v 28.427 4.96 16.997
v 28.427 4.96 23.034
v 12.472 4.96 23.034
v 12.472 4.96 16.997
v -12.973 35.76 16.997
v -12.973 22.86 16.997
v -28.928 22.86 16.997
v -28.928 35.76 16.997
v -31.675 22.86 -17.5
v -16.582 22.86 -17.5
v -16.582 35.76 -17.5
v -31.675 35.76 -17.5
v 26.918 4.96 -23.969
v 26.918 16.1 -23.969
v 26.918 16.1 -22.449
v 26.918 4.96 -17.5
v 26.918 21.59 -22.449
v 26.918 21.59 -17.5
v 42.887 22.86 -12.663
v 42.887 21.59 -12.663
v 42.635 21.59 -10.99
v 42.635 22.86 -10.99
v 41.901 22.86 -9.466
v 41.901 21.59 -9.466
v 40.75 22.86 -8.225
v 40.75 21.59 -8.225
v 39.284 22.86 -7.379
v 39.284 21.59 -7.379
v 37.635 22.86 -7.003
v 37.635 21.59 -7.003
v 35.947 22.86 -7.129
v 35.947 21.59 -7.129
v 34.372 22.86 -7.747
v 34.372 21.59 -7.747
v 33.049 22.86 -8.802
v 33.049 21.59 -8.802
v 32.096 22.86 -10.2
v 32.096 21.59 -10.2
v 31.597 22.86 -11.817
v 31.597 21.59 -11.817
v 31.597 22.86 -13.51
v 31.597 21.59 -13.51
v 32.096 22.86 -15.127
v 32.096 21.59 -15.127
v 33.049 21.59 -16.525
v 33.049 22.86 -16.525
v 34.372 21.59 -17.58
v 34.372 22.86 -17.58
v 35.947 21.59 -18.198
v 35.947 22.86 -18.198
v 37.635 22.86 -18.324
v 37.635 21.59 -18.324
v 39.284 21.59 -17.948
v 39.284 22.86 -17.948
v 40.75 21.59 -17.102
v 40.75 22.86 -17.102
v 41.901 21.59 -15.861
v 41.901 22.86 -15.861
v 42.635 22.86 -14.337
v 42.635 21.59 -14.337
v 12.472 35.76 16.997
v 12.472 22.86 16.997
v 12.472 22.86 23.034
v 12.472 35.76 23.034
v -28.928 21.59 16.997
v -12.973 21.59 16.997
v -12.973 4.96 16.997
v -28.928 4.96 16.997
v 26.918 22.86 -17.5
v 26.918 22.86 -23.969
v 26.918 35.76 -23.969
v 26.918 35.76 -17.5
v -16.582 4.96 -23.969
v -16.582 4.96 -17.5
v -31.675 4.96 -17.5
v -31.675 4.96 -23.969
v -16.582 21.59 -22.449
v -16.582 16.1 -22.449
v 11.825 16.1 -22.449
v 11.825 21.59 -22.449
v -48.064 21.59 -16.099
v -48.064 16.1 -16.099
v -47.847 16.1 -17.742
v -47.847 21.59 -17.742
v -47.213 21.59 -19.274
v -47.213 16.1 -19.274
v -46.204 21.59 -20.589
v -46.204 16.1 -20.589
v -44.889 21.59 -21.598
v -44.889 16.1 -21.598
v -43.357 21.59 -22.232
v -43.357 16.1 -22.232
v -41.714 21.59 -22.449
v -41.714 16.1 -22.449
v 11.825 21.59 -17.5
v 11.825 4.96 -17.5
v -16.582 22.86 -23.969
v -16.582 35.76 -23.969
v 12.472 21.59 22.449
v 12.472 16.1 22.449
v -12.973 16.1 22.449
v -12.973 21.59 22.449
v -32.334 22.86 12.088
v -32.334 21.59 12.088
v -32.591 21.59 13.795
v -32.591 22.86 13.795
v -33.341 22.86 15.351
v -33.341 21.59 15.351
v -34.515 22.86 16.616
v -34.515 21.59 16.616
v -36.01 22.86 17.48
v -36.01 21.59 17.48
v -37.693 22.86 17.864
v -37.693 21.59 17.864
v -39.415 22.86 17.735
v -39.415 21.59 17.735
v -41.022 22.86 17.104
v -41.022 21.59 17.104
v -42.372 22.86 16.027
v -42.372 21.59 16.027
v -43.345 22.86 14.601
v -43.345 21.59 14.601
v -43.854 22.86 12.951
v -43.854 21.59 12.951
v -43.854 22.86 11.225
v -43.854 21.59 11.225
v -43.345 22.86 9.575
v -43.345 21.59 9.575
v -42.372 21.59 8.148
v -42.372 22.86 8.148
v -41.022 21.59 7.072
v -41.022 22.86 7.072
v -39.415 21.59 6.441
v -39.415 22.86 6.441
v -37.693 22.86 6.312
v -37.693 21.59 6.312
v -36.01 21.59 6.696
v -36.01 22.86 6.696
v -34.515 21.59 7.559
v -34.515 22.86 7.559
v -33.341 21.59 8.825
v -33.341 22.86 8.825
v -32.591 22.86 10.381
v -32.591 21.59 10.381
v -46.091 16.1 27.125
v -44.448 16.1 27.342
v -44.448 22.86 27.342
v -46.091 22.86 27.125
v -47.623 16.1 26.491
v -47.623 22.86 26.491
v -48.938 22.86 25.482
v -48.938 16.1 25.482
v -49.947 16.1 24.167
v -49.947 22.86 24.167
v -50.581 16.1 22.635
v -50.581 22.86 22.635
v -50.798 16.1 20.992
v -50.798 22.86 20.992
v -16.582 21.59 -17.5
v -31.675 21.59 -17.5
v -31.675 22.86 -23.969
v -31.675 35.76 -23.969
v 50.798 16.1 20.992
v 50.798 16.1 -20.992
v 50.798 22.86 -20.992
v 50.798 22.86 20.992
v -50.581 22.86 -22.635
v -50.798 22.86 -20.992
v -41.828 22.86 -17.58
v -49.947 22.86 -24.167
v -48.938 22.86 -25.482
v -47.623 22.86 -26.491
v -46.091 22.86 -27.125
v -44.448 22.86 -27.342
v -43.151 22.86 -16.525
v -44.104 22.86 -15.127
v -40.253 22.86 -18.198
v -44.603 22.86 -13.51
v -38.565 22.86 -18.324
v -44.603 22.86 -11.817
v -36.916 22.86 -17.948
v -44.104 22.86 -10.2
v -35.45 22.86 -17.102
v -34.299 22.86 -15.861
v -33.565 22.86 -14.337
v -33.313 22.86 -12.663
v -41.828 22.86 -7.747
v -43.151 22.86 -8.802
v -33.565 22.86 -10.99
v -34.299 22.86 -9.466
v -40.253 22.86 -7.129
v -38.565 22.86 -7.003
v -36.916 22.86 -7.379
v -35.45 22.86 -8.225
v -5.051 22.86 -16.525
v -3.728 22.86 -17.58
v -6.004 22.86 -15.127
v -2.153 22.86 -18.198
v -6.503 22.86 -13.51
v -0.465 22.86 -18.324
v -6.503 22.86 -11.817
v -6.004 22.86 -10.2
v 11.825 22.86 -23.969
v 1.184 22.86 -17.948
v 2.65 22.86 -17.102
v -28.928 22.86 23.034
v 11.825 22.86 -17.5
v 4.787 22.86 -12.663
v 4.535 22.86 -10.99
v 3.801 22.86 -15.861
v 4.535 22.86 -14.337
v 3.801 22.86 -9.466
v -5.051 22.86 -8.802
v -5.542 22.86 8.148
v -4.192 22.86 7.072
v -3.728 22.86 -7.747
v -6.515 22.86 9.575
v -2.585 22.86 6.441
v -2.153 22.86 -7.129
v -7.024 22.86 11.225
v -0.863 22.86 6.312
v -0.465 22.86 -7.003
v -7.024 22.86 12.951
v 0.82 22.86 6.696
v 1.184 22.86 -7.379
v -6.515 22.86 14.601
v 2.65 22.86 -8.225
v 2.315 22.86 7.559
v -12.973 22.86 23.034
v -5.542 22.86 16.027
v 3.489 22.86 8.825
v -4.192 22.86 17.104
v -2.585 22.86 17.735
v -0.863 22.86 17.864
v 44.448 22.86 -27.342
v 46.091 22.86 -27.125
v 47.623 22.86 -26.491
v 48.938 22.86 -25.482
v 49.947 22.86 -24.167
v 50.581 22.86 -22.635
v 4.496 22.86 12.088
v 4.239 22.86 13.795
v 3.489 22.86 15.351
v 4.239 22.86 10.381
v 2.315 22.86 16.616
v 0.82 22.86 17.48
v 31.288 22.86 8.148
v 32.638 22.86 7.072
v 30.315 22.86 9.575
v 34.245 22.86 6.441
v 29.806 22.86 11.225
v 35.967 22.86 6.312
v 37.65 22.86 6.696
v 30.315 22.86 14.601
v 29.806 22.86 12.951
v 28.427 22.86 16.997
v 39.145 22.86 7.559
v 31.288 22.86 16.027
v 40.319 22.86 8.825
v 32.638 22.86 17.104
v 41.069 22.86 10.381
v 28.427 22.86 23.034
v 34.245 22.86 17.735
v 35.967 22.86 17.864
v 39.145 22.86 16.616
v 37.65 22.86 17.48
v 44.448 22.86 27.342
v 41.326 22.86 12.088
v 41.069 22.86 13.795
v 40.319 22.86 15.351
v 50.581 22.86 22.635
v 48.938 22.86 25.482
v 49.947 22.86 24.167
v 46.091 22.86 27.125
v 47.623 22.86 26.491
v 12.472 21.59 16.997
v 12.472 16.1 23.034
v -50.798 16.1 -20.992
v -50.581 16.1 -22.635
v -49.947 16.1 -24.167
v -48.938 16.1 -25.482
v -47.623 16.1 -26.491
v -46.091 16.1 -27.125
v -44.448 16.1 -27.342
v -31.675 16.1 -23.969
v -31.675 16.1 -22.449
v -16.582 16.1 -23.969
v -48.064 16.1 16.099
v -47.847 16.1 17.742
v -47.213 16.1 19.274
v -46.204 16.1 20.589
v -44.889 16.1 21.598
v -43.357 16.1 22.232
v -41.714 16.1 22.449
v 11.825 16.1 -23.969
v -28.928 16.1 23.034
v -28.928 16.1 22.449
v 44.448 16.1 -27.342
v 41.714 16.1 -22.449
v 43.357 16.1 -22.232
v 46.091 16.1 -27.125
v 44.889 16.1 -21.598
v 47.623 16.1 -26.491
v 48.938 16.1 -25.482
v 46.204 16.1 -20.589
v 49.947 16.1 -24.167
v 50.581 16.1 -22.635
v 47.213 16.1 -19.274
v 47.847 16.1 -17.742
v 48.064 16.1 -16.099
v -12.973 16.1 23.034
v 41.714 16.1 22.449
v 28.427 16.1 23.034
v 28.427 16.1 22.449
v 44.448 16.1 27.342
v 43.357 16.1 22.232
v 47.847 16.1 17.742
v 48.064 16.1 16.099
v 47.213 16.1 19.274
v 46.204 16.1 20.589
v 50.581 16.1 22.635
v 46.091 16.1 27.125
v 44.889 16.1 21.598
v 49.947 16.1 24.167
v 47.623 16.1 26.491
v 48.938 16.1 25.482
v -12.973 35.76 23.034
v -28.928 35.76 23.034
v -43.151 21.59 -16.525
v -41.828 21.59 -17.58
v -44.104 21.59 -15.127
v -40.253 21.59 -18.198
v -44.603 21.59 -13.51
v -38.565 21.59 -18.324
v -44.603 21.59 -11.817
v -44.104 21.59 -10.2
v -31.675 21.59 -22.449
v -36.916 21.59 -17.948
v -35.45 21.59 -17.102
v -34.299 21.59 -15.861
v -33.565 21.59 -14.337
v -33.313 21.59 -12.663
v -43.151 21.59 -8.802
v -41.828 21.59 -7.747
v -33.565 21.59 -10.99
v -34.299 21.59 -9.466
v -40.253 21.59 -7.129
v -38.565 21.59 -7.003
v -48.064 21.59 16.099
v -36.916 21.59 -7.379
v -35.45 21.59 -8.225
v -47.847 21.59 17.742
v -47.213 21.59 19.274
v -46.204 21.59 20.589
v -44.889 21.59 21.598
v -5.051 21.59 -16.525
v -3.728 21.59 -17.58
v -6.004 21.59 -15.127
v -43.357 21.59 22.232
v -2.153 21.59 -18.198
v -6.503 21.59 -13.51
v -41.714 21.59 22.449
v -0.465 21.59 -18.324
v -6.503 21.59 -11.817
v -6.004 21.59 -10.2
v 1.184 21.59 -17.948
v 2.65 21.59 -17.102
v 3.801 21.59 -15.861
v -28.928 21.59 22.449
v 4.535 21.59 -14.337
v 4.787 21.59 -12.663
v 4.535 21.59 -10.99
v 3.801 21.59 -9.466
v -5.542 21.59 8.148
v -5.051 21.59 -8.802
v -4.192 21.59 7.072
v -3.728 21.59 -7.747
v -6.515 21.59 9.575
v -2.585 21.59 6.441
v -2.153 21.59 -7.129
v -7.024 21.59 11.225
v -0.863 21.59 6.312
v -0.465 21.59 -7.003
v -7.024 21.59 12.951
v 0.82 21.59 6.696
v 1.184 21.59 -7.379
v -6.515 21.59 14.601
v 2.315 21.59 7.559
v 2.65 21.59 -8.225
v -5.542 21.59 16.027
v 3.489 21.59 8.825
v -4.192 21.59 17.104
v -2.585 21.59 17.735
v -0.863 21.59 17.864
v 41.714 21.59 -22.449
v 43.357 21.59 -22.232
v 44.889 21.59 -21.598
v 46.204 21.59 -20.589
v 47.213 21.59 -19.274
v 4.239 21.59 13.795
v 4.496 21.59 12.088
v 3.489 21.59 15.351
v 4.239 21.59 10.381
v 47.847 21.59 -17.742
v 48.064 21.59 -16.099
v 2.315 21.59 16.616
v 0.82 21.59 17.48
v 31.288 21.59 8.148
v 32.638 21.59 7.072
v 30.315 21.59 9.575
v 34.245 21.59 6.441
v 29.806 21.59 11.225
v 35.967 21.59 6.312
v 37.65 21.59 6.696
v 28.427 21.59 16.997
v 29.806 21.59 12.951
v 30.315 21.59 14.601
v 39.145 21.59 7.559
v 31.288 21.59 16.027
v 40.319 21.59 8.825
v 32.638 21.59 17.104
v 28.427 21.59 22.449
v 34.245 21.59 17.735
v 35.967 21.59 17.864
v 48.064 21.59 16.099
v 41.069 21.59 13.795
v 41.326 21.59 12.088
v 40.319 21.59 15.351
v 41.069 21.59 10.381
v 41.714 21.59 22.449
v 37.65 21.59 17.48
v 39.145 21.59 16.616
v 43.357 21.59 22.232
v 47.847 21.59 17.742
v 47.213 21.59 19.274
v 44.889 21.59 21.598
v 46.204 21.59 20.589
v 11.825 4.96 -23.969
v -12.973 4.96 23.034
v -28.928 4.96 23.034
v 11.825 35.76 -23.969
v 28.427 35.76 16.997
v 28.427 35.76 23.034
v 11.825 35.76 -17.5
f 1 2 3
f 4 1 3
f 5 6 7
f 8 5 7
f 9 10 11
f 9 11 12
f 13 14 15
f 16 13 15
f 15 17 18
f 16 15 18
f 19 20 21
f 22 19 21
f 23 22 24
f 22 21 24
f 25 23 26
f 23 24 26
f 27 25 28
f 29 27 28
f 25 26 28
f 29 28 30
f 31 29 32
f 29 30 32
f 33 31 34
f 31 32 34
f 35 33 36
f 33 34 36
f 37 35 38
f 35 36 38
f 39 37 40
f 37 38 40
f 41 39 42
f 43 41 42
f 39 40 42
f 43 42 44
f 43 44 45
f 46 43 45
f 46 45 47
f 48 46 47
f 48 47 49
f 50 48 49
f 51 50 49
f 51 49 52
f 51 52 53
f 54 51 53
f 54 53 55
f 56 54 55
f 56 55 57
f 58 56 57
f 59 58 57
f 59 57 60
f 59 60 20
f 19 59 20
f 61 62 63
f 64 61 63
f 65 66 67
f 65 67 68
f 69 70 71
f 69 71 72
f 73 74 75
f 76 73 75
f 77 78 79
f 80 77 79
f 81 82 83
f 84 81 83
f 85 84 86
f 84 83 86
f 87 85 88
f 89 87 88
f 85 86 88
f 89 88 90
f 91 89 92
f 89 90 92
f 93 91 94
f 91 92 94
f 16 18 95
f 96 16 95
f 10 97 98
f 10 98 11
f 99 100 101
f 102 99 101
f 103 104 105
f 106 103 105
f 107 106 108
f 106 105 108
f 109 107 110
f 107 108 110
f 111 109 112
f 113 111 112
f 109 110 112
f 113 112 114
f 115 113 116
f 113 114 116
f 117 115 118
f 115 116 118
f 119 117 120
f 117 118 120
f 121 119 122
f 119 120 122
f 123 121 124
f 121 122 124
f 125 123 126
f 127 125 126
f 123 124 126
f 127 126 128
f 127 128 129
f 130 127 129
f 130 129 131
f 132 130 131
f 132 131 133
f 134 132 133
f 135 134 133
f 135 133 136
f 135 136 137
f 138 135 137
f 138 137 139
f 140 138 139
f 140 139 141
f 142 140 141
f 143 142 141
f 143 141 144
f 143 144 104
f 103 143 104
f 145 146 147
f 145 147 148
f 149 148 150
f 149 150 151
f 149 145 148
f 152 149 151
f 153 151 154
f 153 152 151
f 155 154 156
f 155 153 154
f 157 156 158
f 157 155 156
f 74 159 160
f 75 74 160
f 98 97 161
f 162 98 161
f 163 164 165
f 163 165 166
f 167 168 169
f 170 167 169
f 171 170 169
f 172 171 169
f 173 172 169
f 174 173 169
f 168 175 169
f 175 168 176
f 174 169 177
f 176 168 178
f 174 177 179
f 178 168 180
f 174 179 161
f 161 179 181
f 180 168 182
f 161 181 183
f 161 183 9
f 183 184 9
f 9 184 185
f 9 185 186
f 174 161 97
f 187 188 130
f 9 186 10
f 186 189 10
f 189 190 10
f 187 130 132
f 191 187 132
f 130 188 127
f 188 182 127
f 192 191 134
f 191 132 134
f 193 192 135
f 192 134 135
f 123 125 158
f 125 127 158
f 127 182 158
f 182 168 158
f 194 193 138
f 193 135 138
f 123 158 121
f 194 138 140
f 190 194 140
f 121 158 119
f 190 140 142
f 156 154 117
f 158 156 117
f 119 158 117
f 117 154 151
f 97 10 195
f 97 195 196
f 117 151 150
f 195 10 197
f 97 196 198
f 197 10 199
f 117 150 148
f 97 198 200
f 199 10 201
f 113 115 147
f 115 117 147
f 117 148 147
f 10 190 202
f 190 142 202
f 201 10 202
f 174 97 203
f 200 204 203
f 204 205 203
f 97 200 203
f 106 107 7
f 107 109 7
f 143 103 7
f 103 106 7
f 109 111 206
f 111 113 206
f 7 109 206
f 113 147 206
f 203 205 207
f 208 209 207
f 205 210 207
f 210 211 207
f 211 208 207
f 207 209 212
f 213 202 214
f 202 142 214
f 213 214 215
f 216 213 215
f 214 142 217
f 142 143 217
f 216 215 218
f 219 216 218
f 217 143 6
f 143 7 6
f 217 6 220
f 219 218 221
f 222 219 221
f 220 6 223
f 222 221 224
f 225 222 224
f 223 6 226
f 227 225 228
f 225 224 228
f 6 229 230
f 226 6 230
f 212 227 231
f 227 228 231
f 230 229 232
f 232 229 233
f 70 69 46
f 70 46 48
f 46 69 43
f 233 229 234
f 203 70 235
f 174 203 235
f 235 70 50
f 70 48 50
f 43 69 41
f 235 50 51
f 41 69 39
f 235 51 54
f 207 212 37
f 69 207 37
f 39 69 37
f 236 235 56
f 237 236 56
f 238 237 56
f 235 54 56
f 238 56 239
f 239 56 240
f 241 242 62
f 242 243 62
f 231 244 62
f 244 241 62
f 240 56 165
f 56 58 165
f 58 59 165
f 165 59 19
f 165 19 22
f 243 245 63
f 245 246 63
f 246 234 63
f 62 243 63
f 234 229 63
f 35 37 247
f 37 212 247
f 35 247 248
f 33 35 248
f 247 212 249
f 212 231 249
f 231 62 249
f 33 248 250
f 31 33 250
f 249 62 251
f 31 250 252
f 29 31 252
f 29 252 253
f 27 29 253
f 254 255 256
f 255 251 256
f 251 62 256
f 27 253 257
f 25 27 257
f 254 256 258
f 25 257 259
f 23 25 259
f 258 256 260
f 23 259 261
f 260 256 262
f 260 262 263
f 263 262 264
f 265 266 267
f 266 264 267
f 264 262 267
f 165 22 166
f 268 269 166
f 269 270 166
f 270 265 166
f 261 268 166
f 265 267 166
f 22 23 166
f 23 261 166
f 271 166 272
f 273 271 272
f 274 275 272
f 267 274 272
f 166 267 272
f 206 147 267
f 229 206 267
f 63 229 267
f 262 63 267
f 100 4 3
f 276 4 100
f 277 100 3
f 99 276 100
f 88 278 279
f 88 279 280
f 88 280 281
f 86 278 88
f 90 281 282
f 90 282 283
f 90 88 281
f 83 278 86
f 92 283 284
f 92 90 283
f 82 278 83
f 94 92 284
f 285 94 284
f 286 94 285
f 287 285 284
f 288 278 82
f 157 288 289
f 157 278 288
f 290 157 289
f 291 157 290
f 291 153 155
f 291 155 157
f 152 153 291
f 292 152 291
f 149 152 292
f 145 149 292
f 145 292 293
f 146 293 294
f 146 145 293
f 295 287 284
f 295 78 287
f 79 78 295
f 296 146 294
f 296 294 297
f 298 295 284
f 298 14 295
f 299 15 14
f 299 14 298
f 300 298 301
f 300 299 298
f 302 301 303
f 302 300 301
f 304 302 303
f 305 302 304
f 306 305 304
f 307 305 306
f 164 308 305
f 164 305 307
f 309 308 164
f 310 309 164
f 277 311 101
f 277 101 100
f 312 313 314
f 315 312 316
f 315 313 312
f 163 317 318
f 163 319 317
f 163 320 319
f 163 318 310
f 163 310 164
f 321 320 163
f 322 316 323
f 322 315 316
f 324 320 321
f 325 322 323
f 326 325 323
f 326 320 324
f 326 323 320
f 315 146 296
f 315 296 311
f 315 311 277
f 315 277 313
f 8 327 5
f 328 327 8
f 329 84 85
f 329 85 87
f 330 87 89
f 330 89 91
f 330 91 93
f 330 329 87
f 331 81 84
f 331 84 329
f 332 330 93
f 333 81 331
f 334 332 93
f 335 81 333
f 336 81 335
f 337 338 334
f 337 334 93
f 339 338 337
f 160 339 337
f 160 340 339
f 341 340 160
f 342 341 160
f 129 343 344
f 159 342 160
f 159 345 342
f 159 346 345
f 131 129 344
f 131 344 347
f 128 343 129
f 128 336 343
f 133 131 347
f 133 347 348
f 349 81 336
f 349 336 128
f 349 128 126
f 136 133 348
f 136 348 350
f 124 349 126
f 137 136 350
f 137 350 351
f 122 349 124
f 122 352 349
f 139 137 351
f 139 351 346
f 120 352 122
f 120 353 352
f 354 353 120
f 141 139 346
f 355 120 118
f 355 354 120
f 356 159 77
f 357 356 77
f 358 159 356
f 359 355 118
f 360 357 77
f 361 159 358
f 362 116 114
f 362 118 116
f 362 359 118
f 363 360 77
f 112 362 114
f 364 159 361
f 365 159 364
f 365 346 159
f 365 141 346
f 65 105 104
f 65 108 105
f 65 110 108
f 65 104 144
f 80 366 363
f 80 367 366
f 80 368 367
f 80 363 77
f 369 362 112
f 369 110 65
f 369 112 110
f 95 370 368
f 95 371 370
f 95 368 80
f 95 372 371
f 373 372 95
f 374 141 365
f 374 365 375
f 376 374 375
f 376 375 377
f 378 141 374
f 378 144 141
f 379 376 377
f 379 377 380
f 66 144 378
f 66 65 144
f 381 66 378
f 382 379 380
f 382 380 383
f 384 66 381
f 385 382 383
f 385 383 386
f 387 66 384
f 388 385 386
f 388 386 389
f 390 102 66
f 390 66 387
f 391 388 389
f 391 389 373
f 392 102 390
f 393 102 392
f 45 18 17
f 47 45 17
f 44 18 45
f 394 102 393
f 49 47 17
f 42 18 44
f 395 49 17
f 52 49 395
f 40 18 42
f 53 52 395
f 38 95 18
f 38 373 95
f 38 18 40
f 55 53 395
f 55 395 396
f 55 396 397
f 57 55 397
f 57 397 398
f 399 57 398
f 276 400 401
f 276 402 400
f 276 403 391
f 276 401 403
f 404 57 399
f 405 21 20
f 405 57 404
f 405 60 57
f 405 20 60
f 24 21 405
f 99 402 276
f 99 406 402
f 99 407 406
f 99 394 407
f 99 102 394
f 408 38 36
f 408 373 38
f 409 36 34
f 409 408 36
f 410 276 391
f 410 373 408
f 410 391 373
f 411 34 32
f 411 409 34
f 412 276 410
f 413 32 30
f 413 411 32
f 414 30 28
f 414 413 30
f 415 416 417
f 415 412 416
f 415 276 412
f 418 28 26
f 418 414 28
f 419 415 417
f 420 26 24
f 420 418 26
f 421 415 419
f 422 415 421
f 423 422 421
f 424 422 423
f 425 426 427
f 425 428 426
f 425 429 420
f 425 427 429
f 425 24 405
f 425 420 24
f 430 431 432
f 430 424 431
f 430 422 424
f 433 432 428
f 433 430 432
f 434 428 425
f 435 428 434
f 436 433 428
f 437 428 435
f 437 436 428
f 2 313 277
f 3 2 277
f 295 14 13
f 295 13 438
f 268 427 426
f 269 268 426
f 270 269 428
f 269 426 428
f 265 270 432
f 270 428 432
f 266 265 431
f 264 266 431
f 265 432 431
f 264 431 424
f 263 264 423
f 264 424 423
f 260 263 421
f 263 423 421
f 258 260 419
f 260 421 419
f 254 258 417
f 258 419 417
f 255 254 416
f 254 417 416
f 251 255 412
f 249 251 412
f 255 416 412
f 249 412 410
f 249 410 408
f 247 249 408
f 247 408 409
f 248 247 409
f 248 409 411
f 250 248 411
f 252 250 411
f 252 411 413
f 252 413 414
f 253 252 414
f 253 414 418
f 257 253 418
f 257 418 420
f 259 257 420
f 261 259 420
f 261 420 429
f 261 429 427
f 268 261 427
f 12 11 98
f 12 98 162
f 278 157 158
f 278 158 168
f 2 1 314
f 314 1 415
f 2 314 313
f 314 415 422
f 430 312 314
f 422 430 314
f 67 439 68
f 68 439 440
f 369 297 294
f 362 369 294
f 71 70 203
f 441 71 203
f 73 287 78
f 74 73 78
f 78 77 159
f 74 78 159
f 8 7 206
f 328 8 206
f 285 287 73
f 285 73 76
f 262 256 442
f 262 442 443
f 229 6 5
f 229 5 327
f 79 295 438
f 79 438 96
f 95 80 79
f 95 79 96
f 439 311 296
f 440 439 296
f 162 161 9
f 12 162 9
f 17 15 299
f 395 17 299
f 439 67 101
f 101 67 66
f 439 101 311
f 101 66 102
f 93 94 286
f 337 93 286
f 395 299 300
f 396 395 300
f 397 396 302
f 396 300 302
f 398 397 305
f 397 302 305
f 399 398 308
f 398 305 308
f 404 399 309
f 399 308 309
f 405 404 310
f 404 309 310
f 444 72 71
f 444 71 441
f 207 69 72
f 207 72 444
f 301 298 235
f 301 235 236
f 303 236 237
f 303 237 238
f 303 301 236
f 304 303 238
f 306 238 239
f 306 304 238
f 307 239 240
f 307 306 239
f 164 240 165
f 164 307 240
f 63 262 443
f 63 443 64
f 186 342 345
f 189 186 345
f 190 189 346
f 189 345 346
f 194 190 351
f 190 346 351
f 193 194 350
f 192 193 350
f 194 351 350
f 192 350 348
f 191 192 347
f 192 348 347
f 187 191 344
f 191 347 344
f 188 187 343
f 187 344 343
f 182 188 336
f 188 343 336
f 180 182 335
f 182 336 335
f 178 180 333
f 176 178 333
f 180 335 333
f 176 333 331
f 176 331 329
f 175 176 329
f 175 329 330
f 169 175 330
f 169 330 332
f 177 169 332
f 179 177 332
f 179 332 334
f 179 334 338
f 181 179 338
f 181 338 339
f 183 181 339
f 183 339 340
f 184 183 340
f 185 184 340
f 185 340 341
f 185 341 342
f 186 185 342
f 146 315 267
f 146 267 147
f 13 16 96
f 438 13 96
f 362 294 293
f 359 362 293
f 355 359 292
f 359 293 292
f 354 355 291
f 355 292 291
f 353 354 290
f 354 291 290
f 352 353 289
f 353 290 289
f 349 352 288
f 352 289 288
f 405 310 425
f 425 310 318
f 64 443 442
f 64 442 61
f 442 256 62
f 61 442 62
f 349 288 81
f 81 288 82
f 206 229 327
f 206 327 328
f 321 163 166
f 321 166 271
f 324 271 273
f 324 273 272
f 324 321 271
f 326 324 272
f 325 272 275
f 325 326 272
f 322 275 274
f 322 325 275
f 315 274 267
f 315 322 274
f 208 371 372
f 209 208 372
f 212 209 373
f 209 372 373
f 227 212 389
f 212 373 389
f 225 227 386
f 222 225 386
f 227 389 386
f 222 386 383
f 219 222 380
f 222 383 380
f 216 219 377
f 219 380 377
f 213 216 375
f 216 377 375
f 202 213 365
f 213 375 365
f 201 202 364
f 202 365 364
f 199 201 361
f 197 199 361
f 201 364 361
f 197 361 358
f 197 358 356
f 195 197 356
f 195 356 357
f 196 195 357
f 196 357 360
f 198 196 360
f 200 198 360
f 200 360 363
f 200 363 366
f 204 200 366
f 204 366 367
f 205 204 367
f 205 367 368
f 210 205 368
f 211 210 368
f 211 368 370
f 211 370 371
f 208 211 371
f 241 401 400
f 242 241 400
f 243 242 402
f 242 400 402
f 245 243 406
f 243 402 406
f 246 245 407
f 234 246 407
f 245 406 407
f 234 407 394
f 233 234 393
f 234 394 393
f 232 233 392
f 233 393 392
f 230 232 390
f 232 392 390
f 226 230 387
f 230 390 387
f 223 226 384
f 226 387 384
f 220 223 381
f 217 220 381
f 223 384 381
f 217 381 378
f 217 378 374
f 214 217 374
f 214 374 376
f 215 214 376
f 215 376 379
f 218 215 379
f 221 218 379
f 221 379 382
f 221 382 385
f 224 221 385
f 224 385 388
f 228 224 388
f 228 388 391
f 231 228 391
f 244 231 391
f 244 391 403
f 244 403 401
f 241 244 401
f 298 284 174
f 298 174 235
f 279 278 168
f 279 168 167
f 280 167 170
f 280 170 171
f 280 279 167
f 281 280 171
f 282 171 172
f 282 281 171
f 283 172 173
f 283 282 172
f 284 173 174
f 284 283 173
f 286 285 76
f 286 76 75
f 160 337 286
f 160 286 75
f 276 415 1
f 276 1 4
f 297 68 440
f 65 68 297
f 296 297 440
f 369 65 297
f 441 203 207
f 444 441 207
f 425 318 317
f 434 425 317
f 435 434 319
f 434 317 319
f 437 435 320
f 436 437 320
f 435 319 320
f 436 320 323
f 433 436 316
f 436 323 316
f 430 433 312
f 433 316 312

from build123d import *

# Parameters (mm, degrees)
F1_DEPTH = 22.86
F3_DEPTH = 21.59
F4_R     = 5.7920726269
F4_R_2   = 5.6767618258
F5_DEPTH = 25.4
F6_W     = 15.9551920369
F6_H     = 6.0370992869
F6_W_2   = 15.0927454233
F6_H_2   = 6.4683184028
F7_DEPTH = 12.9
F8_DEPTH = 16.1
F9_DEPTH = 30.8


with BuildPart() as f1:
    # F0 (on Front) → F1 (new body)
    with BuildSketch(Plane.XZ):
        with BuildLine():
            ThreePointArc((-50.7977157831, -20.9915483534), (-48.9378438437, -25.481676414), (-44.4477157831, -27.3415483534))
            Line((-44.4477157831, -27.3415483534), (44.4477157831, -27.3415483534))
            ThreePointArc((44.4477157831, -27.3415483534), (48.9378438437, -25.481676414), (50.7977157831, -20.9915483534))
            Line((50.7977157831, -20.9915483534), (50.7977157831, 20.9915483534))
            ThreePointArc((50.7977157831, 20.9915483534), (48.9378438437, 25.481676414), (44.4477157831, 27.3415483534))
            Line((44.4477157831, 27.3415483534), (-44.4477157831, 27.3415483534))
            ThreePointArc((-44.4477157831, 27.3415483534), (-48.9378438437, 25.481676414), (-50.7977157831, 20.9915483534))
            Line((-50.7977157831, 20.9915483534), (-50.7977157831, -20.9915483534))
        make_face()
        with BuildLine():
            Line((37.8281841218, -17.8439579904), (-37.8281841218, -17.8439579904))
            ThreePointArc((-37.8281841218, -17.8439579904), (-42.3183121824, -15.9840860509), (-44.1781841218, -11.4939579904))
            Line((-44.1781841218, -11.4939579904), (-44.1781841218, 11.4939579904))
            ThreePointArc((-44.1781841218, 11.4939579904), (-42.3183121824, 15.9840860509), (-37.8281841218, 17.8439579904))
            Line((-37.8281841218, 17.8439579904), (37.8281841218, 17.8439579904))
            ThreePointArc((37.8281841218, 17.8439579904), (42.3183121824, 15.9840860509), (44.1781841218, 11.4939579904))
            Line((44.1781841218, 11.4939579904), (44.1781841218, -11.4939579904))
            ThreePointArc((44.1781841218, -11.4939579904), (42.3183121824, -15.9840860509), (37.8281841218, -17.8439579904))
        make_face(mode=Mode.SUBTRACT)
        with BuildLine():
            ThreePointArc((-44.1781841218, -11.4939579904), (-42.3183121824, -15.9840860509), (-37.8281841218, -17.8439579904))
            Line((-37.8281841218, -17.8439579904), (37.8281841218, -17.8439579904))
            ThreePointArc((37.8281841218, -17.8439579904), (42.3183121824, -15.9840860509), (44.1781841218, -11.4939579904))
            Line((44.1781841218, -11.4939579904), (44.1781841218, 11.4939579904))
            ThreePointArc((44.1781841218, 11.4939579904), (42.3183121824, 15.9840860509), (37.8281841218, 17.8439579904))
            Line((37.8281841218, 17.8439579904), (-37.8281841218, 17.8439579904))
            ThreePointArc((-37.8281841218, 17.8439579904), (-42.3183121824, 15.9840860509), (-44.1781841218, 11.4939579904))
            Line((-44.1781841218, 11.4939579904), (-44.1781841218, -11.4939579904))
        make_face()
    extrude(amount=-F1_DEPTH)

    # F2 (on Front) → F3 (cut)
    with BuildSketch(Plane.XZ):
        with BuildLine():
            Line((-41.7135613203, -22.448848933), (41.7135613203, -22.448848933))
            ThreePointArc((41.7135613203, -22.448848933), (46.2036893808, -20.5889769935), (48.0635613203, -16.098848933))
            Line((48.0635613203, -16.098848933), (48.0635613203, 16.098848933))
            ThreePointArc((48.0635613203, 16.098848933), (46.2036893808, 20.5889769935), (41.7135613203, 22.448848933))
            Line((41.7135613203, 22.448848933), (-41.7135613203, 22.448848933))
            ThreePointArc((-41.7135613203, 22.448848933), (-46.2036893808, 20.5889769935), (-48.0635613203, 16.098848933))
            Line((-48.0635613203, 16.098848933), (-48.0635613203, -16.098848933))
            ThreePointArc((-48.0635613203, -16.098848933), (-46.2036893808, -20.5889769935), (-41.7135613203, -22.448848933))
        make_face()
    extrude(amount=-F3_DEPTH, mode=Mode.SUBTRACT)

    # F4 (on face) → F5 (cut)
    with BuildSketch(Plane.XZ.offset(-21.59)):
        with Locations((-38.1261706352, 12.0878387243)):
            Circle(F4_R)
        with Locations((-1.2961706352, 12.0878387243)):
            Circle(F4_R)
        with Locations((35.5338293648, 12.0878387243)):
            Circle(F4_R)
        with Locations((-38.9896593988, -12.66345568)):
            Circle(F4_R_2)
        with Locations((-0.8896593988, -12.66345568)):
            Circle(F4_R_2)
        with Locations((37.2103406012, -12.66345568)):
            Circle(F4_R_2)
    extrude(amount=-F5_DEPTH, mode=Mode.SUBTRACT)

    # F6 (on face) → F7 (join)
    with BuildSketch(Plane(origin=(0, 22.86, 0), x_dir=(-1, 0, 0), z_dir=(0, 1, 0))):
        with Locations((-20.4493920319, 20.0157957152)):
            Rectangle(F6_W, F6_H)
        with Locations((20.9506079681, 20.0157957152)):
            Rectangle(F6_W, F6_H)
        with Locations((-19.3713400513, -20.7346286625)):
            Rectangle(F6_W_2, F6_H_2)
        with Locations((24.1286599487, -20.7346286625)):
            Rectangle(F6_W_2, F6_H_2)
    extrude(amount=F7_DEPTH)

    # F8 (cut): a face of the model
    f8_faces = [f1.faces().sort_by_distance(p)[0] for p in [
        (-48.1220046199, 0, 24.6658371902),
    ]]
    extrude(f8_faces, amount=-F8_DEPTH, mode=Mode.SUBTRACT)

    # F9 (add): faces of the model
    f9_faces = [f1.faces().sort_by_distance(p)[0] for p in [
        (20.4493920319, 35.76, 20.0157957152),
        (-20.9506079681, 35.76, 20.0157957152),
        (-24.1286599487, 35.76, -20.7346286625),
        (19.3713400513, 35.76, -20.7346286625),
    ]]
    extrude(f9_faces, amount=-F9_DEPTH)


solid = f1.part
